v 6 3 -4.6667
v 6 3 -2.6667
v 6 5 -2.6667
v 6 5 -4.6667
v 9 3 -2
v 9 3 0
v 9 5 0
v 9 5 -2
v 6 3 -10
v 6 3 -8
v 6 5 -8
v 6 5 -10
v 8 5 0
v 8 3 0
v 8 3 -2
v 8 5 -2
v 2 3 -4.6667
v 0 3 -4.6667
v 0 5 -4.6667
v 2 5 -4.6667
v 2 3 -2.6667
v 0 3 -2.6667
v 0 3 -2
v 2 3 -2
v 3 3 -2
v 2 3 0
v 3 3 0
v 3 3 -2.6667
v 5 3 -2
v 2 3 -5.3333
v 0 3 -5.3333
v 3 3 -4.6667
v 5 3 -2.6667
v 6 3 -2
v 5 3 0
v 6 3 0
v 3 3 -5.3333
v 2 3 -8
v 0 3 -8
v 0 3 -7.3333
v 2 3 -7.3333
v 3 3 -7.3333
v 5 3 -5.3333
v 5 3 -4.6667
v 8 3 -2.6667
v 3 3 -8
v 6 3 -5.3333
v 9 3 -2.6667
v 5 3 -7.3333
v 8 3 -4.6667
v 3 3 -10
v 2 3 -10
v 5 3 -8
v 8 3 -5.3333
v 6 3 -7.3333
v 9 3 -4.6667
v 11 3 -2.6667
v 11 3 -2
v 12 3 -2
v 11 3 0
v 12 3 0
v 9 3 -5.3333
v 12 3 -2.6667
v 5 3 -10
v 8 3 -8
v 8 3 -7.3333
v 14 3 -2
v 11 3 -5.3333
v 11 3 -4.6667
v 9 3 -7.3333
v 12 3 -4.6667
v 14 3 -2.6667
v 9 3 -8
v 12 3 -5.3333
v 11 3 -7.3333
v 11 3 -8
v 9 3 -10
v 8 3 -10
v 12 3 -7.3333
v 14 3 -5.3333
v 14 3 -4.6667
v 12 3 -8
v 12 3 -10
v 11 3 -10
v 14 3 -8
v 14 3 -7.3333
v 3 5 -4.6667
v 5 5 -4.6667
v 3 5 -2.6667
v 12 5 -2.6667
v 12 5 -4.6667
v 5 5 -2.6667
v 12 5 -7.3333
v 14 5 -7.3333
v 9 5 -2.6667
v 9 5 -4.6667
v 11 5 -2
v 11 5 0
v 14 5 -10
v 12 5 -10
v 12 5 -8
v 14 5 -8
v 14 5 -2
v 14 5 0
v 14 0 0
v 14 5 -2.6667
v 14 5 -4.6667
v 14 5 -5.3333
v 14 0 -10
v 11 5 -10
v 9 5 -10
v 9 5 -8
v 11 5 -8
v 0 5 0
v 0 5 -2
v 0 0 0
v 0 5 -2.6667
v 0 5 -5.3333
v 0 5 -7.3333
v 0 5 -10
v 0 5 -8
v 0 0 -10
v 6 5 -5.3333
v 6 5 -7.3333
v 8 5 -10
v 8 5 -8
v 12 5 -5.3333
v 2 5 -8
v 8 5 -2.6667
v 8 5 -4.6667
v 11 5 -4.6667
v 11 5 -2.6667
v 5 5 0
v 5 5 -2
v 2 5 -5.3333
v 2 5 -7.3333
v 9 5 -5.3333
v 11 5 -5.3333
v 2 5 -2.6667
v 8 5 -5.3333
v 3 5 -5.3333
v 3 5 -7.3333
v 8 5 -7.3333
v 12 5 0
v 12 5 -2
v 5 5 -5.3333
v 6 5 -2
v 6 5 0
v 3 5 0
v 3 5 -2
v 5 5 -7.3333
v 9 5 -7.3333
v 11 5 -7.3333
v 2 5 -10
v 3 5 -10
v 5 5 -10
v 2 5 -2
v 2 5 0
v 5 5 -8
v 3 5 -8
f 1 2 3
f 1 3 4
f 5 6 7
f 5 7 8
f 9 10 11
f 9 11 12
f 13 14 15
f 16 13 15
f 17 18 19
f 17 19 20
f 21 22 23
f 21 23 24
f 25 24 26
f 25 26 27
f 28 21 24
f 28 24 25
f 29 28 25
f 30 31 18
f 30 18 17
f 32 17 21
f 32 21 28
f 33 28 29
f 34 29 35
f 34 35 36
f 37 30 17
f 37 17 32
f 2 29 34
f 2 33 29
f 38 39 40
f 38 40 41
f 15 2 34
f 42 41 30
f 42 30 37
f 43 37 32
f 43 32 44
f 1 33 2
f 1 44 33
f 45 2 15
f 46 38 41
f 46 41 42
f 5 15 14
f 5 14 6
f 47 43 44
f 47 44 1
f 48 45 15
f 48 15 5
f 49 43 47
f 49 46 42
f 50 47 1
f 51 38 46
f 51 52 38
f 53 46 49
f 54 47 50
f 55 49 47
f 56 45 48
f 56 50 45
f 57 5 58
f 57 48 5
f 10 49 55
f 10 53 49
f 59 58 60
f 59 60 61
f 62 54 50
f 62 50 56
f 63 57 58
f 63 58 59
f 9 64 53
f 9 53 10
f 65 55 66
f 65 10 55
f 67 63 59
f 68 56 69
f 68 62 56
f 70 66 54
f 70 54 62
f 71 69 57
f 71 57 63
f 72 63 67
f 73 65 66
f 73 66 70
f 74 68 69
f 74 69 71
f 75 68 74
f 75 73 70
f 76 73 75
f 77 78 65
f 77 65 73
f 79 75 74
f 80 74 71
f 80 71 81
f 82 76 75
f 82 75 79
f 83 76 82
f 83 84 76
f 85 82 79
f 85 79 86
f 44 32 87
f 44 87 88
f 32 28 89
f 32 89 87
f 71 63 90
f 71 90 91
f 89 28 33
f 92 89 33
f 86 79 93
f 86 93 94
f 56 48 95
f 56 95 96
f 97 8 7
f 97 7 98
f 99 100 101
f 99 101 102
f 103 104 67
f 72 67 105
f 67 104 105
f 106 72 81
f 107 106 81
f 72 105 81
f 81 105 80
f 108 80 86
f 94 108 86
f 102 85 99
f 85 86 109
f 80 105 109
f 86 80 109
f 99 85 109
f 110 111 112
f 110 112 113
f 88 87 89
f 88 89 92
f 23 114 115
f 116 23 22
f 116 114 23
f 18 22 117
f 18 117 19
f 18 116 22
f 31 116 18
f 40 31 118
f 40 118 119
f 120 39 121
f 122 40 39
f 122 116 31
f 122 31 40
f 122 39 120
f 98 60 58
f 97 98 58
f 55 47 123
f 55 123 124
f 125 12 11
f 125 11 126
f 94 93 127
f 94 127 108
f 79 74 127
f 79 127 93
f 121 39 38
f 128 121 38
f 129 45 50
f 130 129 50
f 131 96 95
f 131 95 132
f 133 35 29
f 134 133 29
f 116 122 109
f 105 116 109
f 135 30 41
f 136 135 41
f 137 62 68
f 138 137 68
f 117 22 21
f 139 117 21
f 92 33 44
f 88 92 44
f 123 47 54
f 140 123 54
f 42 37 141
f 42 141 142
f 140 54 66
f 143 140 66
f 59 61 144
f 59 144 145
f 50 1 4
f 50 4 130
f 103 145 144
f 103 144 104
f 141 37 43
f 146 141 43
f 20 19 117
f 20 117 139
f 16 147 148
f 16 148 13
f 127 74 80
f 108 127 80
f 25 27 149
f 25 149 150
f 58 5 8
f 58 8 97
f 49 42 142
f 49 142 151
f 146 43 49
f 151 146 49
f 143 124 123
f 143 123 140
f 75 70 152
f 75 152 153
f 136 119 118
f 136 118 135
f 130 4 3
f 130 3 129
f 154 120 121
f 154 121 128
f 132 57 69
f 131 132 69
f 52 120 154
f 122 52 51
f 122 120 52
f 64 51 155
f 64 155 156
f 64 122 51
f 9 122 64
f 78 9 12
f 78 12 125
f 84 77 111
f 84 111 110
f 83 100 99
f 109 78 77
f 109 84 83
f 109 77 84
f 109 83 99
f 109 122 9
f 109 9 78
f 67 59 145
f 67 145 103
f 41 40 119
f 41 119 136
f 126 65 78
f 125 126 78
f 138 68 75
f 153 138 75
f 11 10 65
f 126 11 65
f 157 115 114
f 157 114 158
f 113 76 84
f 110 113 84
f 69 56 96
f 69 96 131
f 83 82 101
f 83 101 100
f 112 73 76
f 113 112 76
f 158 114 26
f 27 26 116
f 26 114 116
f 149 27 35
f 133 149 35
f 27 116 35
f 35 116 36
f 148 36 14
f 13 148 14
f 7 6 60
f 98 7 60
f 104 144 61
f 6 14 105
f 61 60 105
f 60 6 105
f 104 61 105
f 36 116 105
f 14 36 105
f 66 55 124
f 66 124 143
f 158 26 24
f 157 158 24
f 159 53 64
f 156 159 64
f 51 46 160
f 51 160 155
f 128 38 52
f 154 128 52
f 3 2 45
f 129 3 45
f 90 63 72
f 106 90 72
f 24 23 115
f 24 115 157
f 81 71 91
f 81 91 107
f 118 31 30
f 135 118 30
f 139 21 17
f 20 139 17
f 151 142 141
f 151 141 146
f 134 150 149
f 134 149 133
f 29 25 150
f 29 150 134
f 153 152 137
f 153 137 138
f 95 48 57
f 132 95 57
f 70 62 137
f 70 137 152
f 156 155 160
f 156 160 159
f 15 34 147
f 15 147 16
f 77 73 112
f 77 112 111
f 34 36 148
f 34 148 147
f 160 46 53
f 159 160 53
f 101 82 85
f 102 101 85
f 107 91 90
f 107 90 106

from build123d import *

# Parameters (mm, degrees)
SKETCH1_W           = 14
SKETCH1_H           = 10
BOSS_EXTRUDE1_DEPTH = 3
SKETCH2_W           = 2
SKETCH2_H           = 2
BOSS_EXTRUDE2_DEPTH = 2


with BuildPart() as part:
    # Sketch1 → Boss-Extrude1 (new body)
    with BuildSketch(Plane(origin=(0, 0, 0), x_dir=(1, 0, 0), z_dir=(0, 1, 0))):
        with Locations((7, 5)):
            Rectangle(SKETCH1_W, SKETCH1_H)
    extrude(amount=BOSS_EXTRUDE1_DEPTH)

    # Sketch2 → Boss-Extrude2 (add)
    with BuildSketch(Plane(origin=(0, 3, 0), x_dir=(1, 0, 0), z_dir=(0, 1, 0))):
        with Locations((4, 1)):
            Rectangle(SKETCH2_W, SKETCH2_H)
        with Locations((1, 1)):
            Rectangle(SKETCH2_W, SKETCH2_H)
        with Locations((7, 1)):
            Rectangle(SKETCH2_W, SKETCH2_H)
        with Locations((10, 1)):
            Rectangle(SKETCH2_W, SKETCH2_H)
        with Locations((4, 3.666666667)):
            Rectangle(SKETCH2_W, SKETCH2_H)
        with Locations((7, 3.666666667)):
            Rectangle(SKETCH2_W, SKETCH2_H)
        with Locations((10, 3.666666667)):
            Rectangle(SKETCH2_W, SKETCH2_H)
        with Locations((4, 6.333333333)):
            Rectangle(SKETCH2_W, SKETCH2_H)
        with Locations((7, 6.333333333)):
            Rectangle(SKETCH2_W, SKETCH2_H)
        with Locations((10, 6.333333333)):
            Rectangle(SKETCH2_W, SKETCH2_H)
        with Locations((4, 9)):
            Rectangle(SKETCH2_W, SKETCH2_H)
        with Locations((7, 9)):
            Rectangle(SKETCH2_W, SKETCH2_H)
        with Locations((10, 9)):
            Rectangle(SKETCH2_W, SKETCH2_H)
        with Locations((1, 3.666666667)):
            Rectangle(SKETCH2_W, SKETCH2_H)
        with Locations((1, 6.333333333)):
            Rectangle(SKETCH2_W, SKETCH2_H)
        with Locations((1, 9)):
            Rectangle(SKETCH2_W, SKETCH2_H)
        with Locations((13, 1)):
            Rectangle(SKETCH2_W, SKETCH2_H)
        with Locations((13, 3.666666667)):
            Rectangle(SKETCH2_W, SKETCH2_H)
        with Locations((13, 6.333333333)):
            Rectangle(SKETCH2_W, SKETCH2_H)
        with Locations((13, 9)):
            Rectangle(SKETCH2_W, SKETCH2_H)
    extrude(amount=BOSS_EXTRUDE2_DEPTH)


solid = part.part
